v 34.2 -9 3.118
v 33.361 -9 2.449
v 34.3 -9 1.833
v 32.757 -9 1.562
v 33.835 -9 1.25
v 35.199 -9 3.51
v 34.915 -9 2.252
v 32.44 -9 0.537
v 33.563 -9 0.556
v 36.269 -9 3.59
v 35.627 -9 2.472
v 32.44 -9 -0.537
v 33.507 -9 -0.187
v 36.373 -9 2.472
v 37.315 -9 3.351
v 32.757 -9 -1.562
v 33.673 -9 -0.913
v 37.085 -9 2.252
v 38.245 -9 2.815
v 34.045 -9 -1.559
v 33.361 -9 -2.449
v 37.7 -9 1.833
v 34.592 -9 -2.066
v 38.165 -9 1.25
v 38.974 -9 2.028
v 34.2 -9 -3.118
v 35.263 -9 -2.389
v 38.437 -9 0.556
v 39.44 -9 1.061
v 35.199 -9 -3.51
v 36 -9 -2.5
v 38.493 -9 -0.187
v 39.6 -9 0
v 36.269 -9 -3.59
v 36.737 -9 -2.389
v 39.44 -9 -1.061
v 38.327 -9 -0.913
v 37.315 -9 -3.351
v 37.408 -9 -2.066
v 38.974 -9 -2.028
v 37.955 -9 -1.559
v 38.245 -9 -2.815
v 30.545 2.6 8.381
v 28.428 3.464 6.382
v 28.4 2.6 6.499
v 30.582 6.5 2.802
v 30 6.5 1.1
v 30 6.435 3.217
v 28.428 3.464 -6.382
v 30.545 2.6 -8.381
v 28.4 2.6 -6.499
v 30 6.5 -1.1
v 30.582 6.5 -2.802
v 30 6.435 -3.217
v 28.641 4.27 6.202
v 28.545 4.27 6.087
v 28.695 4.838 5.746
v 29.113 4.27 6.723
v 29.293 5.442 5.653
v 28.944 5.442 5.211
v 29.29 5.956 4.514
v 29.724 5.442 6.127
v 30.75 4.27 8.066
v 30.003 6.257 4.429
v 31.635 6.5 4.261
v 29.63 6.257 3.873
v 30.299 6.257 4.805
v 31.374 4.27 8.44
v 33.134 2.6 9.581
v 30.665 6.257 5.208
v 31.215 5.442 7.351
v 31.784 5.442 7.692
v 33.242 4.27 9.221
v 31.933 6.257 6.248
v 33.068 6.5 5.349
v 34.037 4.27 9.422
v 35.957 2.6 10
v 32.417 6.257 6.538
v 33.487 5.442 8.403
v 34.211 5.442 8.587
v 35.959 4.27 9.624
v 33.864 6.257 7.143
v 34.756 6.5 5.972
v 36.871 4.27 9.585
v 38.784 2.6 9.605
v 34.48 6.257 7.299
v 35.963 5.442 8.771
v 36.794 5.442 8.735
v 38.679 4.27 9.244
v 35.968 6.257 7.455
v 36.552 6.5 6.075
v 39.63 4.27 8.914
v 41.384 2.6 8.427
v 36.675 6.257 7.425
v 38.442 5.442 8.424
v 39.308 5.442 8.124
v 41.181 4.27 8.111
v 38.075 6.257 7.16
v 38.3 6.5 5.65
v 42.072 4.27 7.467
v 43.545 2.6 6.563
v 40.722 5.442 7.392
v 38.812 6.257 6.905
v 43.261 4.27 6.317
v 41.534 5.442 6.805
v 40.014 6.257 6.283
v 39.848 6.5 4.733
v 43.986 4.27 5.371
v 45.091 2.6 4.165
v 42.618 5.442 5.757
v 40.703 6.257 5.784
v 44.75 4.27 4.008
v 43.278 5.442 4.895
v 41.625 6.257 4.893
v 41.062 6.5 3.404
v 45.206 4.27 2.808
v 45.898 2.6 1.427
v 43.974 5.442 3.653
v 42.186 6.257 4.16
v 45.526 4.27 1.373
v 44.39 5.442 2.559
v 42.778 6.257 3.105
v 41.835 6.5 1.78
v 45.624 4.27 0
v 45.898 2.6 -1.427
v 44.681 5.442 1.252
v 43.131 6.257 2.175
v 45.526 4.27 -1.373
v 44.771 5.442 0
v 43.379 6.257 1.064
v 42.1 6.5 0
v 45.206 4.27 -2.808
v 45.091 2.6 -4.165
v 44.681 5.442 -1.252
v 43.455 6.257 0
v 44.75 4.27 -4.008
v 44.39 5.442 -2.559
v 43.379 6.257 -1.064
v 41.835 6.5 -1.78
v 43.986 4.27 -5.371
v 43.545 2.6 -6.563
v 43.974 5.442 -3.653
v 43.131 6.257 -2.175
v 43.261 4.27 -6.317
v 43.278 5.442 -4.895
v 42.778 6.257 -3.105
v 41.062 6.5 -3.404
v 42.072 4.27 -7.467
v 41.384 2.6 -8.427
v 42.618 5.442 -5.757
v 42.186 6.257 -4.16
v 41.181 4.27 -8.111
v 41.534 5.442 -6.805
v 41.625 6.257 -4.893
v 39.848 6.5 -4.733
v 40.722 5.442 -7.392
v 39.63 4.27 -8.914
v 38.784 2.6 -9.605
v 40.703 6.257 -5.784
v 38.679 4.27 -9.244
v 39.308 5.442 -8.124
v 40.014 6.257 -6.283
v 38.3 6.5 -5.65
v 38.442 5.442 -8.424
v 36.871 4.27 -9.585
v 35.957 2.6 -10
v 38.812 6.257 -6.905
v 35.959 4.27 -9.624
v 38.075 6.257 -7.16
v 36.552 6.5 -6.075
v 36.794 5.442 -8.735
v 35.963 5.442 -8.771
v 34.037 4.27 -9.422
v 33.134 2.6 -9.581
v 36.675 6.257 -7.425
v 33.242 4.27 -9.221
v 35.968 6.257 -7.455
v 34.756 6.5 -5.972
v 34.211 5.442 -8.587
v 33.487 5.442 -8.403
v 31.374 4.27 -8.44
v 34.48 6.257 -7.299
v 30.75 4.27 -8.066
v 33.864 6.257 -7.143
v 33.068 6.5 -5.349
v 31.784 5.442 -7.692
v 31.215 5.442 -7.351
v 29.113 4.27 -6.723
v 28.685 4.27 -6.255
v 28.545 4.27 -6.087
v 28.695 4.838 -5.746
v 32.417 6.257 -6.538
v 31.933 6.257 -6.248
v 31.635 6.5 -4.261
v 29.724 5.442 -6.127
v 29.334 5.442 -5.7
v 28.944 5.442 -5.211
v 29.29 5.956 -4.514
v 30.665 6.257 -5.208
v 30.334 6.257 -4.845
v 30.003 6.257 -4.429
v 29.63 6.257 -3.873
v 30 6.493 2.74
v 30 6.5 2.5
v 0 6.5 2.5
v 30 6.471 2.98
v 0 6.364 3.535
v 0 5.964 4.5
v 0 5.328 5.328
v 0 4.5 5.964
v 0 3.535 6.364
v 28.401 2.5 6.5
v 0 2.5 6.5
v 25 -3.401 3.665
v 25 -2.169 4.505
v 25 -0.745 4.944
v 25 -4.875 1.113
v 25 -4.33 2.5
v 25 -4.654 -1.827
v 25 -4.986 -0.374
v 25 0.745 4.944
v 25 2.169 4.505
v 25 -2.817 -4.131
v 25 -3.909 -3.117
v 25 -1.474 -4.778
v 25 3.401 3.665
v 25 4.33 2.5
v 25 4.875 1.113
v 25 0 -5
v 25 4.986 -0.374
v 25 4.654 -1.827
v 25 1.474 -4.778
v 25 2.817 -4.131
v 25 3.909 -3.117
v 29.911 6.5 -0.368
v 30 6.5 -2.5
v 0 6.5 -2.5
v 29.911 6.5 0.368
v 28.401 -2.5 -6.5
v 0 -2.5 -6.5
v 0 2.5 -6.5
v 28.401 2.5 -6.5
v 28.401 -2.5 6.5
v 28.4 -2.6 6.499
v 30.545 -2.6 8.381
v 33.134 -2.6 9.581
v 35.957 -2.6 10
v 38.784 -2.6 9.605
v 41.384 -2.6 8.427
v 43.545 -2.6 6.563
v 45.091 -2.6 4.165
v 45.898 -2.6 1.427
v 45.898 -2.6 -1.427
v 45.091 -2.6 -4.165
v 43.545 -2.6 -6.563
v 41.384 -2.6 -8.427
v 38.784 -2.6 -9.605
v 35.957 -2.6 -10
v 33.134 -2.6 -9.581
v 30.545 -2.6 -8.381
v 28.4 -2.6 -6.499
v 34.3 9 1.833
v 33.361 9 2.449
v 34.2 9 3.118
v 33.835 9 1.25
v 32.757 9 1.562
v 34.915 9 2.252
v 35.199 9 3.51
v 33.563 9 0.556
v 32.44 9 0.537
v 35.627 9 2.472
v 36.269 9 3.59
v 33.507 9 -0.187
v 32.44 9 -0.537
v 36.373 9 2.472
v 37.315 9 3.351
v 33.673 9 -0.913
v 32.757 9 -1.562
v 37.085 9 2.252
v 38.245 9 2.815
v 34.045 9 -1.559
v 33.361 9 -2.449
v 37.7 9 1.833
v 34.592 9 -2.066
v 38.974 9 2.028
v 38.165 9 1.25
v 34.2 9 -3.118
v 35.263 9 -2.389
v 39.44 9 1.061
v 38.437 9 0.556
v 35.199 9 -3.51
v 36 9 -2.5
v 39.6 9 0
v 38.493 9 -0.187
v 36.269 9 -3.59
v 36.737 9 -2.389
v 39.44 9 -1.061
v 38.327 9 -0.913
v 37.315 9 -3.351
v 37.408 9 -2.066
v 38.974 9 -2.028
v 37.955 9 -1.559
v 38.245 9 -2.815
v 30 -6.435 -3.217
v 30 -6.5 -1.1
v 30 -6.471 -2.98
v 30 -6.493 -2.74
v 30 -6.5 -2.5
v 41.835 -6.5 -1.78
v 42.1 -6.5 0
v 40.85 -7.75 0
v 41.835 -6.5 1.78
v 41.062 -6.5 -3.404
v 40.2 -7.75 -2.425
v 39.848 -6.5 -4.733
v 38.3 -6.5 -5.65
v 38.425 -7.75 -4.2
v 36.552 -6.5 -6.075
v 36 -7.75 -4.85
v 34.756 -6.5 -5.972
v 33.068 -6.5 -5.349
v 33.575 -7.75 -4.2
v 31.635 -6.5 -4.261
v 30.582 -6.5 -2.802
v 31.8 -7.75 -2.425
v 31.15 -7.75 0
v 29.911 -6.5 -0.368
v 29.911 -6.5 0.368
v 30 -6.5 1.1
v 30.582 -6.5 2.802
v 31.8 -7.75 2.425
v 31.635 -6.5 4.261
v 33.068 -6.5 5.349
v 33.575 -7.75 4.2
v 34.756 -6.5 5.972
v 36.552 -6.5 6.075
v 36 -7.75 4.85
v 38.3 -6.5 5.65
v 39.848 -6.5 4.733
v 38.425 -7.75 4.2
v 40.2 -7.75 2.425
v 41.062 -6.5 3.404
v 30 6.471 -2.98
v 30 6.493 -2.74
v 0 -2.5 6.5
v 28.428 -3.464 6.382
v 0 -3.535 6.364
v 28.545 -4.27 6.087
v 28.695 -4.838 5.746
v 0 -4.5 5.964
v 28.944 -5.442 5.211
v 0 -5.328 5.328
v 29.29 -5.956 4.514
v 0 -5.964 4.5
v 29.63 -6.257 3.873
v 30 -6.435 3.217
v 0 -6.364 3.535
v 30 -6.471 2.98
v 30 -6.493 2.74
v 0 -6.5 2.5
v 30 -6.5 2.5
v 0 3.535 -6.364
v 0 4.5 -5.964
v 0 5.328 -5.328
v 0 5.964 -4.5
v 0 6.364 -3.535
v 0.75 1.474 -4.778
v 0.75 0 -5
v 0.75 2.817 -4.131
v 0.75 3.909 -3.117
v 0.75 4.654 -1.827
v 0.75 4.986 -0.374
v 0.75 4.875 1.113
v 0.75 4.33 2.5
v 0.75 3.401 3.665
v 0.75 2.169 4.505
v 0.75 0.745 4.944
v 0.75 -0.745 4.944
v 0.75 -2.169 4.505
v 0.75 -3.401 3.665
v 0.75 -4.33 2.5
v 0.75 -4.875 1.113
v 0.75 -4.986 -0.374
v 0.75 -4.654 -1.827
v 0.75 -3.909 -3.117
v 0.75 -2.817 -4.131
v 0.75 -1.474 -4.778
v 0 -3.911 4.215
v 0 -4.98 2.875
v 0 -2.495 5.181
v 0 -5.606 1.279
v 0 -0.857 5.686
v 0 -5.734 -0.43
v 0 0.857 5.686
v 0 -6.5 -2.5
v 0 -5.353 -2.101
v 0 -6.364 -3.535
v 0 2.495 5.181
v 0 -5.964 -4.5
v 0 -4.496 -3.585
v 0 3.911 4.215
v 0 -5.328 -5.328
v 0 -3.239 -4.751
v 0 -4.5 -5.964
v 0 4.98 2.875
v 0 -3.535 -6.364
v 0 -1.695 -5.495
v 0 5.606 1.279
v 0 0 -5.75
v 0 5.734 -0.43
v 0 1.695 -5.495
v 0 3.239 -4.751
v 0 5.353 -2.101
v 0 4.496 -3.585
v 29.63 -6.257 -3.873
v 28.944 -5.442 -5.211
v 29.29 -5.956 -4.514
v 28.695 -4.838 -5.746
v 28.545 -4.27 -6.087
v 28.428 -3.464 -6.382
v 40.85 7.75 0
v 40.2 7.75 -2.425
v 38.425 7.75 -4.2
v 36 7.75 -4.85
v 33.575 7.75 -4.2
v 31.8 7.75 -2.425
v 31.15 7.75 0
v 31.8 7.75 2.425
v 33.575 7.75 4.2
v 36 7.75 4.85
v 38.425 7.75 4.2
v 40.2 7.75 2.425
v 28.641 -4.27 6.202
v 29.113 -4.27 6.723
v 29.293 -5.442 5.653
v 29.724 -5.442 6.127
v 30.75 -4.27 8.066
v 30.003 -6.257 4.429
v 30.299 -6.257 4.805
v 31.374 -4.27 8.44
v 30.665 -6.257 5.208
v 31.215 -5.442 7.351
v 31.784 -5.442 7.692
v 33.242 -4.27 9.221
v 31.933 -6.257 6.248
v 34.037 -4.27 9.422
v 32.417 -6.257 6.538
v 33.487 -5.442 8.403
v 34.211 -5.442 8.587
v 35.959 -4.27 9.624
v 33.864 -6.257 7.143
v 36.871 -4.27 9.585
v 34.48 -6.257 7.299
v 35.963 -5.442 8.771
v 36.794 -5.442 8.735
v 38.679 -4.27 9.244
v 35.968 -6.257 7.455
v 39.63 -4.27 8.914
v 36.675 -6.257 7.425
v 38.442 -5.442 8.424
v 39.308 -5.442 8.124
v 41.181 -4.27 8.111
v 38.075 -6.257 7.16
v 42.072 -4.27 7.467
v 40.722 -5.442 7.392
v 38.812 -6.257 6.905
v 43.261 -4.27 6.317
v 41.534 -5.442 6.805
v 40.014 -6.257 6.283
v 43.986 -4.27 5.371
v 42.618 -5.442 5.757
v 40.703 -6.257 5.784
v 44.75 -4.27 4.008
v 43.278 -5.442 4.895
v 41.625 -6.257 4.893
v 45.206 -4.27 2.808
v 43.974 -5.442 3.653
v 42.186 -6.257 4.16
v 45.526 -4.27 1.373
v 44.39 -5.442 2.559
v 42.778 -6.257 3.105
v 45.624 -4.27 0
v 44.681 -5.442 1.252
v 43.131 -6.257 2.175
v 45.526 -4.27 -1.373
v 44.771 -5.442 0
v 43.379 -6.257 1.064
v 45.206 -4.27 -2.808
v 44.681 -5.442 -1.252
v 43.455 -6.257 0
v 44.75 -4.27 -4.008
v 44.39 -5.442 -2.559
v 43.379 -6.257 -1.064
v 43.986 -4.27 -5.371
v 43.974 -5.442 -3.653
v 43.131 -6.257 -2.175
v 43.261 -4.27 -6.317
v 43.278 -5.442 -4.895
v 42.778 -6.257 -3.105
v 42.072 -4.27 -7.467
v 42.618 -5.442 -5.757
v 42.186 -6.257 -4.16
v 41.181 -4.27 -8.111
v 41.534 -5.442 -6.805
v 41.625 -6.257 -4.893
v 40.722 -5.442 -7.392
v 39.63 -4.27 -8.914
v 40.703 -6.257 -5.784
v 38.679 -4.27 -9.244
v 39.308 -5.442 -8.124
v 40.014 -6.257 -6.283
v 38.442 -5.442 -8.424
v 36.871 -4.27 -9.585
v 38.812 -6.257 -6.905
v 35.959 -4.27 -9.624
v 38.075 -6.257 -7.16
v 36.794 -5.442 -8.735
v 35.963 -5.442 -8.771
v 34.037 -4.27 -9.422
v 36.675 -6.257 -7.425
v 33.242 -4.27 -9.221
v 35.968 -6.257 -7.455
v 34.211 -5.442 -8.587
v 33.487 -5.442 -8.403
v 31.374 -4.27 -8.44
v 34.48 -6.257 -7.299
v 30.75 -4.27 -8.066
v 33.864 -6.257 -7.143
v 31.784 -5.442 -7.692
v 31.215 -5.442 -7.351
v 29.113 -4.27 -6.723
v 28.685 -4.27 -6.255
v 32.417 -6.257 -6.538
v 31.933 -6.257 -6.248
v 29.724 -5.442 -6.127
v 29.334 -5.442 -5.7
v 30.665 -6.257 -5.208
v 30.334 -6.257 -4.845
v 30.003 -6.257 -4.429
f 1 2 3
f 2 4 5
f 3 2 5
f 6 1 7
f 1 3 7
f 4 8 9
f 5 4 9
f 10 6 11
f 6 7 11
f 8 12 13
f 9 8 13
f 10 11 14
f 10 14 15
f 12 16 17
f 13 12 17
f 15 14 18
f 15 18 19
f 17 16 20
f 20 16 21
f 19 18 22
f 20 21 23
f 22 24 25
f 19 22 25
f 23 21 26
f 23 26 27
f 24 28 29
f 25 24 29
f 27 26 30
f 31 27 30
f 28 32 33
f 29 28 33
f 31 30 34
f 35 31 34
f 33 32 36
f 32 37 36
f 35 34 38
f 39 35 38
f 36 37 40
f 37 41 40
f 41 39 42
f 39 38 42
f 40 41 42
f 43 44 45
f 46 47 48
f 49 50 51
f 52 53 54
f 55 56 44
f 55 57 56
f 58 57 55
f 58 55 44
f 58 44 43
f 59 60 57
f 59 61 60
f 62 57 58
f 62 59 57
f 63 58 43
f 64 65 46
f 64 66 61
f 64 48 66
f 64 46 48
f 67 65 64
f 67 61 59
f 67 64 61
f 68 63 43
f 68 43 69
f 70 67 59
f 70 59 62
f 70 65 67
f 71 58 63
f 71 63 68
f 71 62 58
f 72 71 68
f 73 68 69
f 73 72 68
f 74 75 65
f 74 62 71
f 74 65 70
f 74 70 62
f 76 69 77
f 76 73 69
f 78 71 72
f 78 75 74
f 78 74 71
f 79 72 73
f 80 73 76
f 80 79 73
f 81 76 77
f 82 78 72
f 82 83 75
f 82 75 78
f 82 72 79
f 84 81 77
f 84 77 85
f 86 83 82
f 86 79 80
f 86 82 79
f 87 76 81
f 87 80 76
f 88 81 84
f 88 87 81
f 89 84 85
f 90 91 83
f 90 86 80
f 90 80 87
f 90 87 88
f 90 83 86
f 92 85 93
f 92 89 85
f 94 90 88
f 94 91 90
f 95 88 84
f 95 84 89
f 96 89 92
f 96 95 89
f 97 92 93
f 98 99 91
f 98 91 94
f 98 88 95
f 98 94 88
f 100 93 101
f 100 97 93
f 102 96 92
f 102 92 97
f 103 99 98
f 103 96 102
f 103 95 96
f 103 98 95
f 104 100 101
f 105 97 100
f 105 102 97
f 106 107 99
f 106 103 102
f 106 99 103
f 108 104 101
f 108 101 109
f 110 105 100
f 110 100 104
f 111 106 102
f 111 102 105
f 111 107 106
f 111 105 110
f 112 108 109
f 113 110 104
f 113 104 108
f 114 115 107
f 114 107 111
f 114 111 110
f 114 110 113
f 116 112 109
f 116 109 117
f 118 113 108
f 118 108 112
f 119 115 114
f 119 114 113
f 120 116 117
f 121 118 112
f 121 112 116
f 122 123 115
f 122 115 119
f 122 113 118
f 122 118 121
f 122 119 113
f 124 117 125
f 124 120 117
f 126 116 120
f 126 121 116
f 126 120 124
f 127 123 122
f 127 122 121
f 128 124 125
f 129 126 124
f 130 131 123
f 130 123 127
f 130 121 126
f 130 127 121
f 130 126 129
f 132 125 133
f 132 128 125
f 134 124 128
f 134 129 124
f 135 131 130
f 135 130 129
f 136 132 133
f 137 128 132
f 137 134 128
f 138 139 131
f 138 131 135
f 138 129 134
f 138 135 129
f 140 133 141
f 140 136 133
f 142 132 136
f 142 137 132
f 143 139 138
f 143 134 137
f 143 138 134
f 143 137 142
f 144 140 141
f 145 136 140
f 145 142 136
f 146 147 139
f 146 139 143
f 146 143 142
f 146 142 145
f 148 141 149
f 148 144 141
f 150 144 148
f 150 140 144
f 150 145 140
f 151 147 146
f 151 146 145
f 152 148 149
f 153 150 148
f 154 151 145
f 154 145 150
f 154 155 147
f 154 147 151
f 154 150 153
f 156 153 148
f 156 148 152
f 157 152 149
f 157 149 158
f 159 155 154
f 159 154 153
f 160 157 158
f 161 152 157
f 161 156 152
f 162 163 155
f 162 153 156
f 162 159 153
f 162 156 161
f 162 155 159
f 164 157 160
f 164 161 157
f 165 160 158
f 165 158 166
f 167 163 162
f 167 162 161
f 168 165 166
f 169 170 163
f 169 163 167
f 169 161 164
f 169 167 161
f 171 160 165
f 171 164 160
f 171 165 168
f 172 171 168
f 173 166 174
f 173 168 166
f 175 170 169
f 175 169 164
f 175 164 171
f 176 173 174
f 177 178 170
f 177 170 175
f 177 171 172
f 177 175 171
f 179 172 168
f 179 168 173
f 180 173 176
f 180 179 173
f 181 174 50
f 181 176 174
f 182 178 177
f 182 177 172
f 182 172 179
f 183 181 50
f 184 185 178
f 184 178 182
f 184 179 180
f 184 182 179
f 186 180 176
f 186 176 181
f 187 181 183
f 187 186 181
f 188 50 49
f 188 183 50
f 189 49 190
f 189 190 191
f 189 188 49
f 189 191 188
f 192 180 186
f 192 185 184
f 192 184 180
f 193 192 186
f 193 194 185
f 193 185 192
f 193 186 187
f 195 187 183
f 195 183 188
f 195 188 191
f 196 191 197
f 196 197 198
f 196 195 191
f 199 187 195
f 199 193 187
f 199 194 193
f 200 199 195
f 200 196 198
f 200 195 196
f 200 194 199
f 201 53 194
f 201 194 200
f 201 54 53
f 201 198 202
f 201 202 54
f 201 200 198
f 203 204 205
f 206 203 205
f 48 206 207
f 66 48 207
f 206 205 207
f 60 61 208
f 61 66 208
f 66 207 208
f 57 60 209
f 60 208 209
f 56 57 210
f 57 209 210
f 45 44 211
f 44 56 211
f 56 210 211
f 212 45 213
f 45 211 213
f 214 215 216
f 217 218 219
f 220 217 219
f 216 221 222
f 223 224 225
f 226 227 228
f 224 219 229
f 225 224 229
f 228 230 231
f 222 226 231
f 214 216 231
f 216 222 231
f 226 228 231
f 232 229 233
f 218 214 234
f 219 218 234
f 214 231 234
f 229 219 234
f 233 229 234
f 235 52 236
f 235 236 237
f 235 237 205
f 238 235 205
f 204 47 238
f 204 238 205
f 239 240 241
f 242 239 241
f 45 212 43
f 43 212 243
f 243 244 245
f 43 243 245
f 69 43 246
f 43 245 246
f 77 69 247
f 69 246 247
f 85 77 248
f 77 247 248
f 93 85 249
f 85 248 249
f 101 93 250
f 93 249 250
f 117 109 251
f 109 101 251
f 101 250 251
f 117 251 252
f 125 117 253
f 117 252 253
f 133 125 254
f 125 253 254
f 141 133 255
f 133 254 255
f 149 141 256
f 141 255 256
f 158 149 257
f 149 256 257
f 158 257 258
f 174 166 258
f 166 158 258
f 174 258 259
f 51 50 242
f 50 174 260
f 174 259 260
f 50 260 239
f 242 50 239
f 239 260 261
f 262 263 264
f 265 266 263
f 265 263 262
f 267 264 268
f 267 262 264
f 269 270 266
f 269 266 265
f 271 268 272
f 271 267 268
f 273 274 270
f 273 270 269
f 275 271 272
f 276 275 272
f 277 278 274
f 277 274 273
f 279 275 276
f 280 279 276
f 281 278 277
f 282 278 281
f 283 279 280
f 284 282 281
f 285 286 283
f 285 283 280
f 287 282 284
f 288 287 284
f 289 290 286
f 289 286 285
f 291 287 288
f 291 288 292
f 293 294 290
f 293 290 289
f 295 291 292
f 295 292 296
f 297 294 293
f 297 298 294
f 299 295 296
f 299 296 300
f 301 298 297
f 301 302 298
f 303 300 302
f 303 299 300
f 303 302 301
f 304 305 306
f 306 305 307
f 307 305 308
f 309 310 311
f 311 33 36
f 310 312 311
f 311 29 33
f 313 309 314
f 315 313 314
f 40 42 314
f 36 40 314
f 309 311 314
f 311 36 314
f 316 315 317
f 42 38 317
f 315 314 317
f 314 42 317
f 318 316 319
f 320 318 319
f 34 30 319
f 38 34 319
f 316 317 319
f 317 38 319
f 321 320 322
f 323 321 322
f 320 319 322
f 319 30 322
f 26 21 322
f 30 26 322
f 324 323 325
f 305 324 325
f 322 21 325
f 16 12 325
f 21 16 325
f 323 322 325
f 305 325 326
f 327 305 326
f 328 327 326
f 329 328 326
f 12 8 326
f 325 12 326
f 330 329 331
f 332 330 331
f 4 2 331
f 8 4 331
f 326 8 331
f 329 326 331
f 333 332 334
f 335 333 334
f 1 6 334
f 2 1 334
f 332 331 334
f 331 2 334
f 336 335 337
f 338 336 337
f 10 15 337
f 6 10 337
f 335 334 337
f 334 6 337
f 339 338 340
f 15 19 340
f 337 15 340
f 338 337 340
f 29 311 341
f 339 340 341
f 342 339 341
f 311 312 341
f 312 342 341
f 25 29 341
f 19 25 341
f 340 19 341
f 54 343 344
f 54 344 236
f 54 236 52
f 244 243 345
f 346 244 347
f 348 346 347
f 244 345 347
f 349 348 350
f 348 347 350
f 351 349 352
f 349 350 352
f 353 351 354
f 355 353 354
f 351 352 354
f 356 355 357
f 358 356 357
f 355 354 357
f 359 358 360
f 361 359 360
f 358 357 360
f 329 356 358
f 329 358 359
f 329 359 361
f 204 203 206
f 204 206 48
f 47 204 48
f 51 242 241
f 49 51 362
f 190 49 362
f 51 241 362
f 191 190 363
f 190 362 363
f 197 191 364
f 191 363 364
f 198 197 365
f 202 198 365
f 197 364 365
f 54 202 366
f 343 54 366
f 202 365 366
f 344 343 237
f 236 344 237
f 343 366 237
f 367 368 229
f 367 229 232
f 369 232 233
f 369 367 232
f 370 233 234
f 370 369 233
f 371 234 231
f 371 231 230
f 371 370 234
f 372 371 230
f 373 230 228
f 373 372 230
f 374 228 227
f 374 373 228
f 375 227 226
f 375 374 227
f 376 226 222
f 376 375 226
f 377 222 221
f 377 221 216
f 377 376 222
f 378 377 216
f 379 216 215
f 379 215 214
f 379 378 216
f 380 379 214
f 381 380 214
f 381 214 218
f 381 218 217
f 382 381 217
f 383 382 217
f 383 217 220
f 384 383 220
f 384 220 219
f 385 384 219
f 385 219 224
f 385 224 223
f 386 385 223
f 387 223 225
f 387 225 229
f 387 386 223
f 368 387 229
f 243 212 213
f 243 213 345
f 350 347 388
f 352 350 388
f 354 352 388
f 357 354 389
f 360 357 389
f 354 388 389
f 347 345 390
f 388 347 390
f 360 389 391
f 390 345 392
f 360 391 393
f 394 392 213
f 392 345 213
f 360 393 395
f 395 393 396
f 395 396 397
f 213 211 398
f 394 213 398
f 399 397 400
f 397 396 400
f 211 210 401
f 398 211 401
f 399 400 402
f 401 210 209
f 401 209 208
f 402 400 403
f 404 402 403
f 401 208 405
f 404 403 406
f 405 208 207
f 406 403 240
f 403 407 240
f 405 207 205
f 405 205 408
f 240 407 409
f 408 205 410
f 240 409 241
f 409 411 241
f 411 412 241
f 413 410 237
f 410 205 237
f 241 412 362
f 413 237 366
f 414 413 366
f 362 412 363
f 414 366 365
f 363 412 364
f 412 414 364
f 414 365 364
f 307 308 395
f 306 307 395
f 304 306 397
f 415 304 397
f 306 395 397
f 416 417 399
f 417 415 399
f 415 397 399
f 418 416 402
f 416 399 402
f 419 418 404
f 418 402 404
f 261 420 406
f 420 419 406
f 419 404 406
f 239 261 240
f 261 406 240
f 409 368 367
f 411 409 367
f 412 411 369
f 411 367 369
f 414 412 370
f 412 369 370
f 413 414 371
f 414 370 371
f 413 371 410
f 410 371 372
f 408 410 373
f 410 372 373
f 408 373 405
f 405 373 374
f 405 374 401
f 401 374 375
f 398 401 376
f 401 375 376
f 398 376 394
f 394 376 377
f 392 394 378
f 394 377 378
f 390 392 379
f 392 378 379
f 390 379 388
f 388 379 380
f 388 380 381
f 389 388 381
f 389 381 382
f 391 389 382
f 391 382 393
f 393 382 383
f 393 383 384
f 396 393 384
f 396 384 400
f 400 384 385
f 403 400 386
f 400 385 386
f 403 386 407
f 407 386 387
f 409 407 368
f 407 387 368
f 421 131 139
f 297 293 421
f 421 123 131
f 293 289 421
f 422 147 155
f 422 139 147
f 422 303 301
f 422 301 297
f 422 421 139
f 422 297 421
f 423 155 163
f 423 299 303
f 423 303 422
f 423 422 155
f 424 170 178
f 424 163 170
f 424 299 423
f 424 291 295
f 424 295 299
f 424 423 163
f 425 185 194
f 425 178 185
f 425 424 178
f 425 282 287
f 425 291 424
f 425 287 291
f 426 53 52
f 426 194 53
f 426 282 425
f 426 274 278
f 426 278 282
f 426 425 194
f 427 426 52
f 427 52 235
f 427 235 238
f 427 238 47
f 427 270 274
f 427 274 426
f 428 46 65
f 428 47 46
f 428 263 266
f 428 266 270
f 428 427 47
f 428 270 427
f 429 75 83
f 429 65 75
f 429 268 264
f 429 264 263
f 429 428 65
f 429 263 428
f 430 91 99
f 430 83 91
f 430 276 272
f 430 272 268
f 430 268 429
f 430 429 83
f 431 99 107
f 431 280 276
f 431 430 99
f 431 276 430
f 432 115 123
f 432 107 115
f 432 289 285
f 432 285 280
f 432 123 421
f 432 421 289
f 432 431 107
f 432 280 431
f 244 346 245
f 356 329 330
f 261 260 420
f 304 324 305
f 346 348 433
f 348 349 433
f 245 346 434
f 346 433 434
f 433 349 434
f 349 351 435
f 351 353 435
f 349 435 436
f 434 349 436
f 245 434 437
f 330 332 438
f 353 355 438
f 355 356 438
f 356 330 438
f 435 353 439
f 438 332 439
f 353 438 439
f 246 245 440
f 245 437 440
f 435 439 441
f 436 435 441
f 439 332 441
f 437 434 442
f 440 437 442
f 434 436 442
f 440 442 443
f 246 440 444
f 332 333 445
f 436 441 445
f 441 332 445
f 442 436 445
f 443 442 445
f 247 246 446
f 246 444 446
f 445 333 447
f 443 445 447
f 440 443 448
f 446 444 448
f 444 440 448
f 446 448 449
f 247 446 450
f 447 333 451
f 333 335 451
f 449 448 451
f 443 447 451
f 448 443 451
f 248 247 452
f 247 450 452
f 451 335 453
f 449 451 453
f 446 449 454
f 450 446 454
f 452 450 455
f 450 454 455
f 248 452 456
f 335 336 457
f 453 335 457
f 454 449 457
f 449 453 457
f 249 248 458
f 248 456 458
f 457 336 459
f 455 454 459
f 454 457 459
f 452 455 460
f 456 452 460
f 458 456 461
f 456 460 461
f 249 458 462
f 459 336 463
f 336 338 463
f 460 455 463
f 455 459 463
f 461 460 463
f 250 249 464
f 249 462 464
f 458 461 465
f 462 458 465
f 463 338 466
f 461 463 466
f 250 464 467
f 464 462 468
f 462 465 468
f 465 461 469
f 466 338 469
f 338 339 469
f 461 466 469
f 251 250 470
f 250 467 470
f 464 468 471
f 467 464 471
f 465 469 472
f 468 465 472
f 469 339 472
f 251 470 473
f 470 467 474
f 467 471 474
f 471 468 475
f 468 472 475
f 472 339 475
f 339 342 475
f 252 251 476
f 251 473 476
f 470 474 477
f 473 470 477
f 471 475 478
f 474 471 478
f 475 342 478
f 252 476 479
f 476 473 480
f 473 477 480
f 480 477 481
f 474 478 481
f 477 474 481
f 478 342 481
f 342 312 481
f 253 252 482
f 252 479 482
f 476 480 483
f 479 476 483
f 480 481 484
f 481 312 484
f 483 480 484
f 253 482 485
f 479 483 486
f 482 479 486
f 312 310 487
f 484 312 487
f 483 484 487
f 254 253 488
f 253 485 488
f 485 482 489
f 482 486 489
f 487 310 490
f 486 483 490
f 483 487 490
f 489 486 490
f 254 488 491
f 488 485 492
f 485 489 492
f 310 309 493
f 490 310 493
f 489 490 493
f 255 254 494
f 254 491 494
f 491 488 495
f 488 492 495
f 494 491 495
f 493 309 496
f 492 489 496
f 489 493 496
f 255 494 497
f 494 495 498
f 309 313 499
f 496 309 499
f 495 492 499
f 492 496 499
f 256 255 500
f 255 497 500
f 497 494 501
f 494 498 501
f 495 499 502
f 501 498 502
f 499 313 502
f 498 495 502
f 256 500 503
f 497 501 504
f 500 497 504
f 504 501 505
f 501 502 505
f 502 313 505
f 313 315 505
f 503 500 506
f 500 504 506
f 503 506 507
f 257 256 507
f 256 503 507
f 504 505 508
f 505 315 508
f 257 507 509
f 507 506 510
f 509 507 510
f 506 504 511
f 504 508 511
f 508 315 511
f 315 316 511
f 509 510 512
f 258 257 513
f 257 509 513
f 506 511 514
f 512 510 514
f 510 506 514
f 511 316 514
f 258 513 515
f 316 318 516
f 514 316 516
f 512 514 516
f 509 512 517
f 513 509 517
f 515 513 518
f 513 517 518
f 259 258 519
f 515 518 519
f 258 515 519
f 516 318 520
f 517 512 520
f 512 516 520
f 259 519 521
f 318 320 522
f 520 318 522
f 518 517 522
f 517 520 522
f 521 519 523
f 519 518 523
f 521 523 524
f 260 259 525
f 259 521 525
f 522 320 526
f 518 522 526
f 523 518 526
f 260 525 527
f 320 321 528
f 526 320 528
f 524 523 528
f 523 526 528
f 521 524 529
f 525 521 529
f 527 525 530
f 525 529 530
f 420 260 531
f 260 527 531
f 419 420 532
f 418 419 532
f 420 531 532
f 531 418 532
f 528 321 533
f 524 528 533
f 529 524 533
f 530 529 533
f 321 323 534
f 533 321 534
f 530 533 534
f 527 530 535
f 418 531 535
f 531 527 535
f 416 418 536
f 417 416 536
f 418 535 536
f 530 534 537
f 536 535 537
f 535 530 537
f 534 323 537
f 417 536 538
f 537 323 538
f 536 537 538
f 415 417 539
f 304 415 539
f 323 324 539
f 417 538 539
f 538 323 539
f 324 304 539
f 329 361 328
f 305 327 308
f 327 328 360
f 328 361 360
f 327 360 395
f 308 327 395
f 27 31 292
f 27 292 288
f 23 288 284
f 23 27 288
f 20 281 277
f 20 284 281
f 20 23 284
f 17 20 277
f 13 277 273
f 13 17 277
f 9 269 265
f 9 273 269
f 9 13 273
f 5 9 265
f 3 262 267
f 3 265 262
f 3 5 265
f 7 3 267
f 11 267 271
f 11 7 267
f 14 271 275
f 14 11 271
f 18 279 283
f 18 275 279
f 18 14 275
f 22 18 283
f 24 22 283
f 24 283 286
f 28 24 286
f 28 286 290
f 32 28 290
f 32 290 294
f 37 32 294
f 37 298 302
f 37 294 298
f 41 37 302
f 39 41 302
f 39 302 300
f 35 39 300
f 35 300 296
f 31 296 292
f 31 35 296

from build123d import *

# Parameters (mm, degrees)
BOSS_EXTRUDE1_DEPTH     = 30
SKETCH1_3_R             = 5
CUT_EXTRUDE1_DEPTH      = 25
CHAMFER1_SIZE           = 0.75
SKETCH3_W               = 10
SKETCH3_H               = 5
SKETCH7_R               = 6.1
BOSS_EXTRUDE3_DEPTH     = 2.5
BOSS_EXTRUDE3_TAPER     = 45
CUT_EXTRUDE3_DEPTH      = 51.39841282
CUT_EXTRUDE3_DEPTH_BACK = 200
SKETCH8_R               = 2.5


with BuildPart() as part:
    # Sketch1 → Boss-Extrude1 (new body)
    with BuildSketch(Plane(origin=(0, 0, 0), x_dir=(0, 0, -1), z_dir=(1, 0, 0))):
        with BuildLine():
            ThreePointArc((6.5, 2.5), (5.328427125, 5.328427125), (2.5, 6.5))
            Line((2.5, 6.5), (-2.5, 6.5))
            ThreePointArc((-2.5, 6.5), (-5.328427125, 5.328427125), (-6.5, 2.5))
            Line((-6.5, 2.5), (-6.5, -2.5))
            ThreePointArc((-6.5, -2.5), (-5.328427125, -5.328427125), (-2.5, -6.5))
            Line((-2.5, -6.5), (2.5, -6.5))
            ThreePointArc((2.5, -6.5), (5.328427125, -5.328427125), (6.5, -2.5))
            Line((6.5, -2.5), (6.5, 2.5))
        make_face()
    extrude(amount=BOSS_EXTRUDE1_DEPTH)

    # Sketch1<3> → Cut-Extrude1 (cut)
    with BuildSketch(Plane(origin=(0, 0, 0), x_dir=(0, 0, -1), z_dir=(1, 0, 0))):
        Circle(SKETCH1_3_R)
    extrude(amount=CUT_EXTRUDE1_DEPTH, mode=Mode.SUBTRACT)

    # Chamfer1
    chamfer1_edges = [part.edges().sort_by_distance(p)[0] for p in [
        (0, 0, 5),
    ]]
    chamfer(chamfer1_edges, length=CHAMFER1_SIZE)

    # Sketch3 → Revolve2 (revolve)
    with BuildSketch(Plane(origin=(36, 0, 0), x_dir=(0, 0, -1), z_dir=(1, 0, 0))):
        with Locations((-5, 0)):
            Rectangle(SKETCH3_W, SKETCH3_H)
    revolve(axis=Axis((36, -11.950836094, 0), (0, 1, 0)))

    # Sketch4 → Revolve3 (revolve)
    with BuildSketch(Plane(origin=(36, 0, 0), x_dir=(0, 0, -1), z_dir=(1, 0, 0))):
        with BuildLine():
            Line((0, 2.5), (-10, 2.5))
            Line((-10, 2.5), (-10, 2.6))
            ThreePointArc((-10, 2.6), (-8.857716447, 5.357716447), (-6.1, 6.5))
            Line((-6.1, 6.5), (0, 6.5))
            Line((0, 6.5), (0, 2.5))
        make_face()
    revolve3 = revolve(axis=Axis((36, -7.102905922, 0), (0, 1, 0)))

    # Mirror3: Revolve3 across plane
    add(revolve3.mirror(Plane.ZX))

    # Sketch7 → Boss-Extrude3 (add)
    with BuildSketch(Plane(origin=(0, 6.5, 0), x_dir=(1, 0, 0), z_dir=(0, 1, 0))):
        with Locations((36, 0)):
            Circle(SKETCH7_R)
    boss_extrude3 = extrude(amount=BOSS_EXTRUDE3_DEPTH, taper=BOSS_EXTRUDE3_TAPER)

    # Mirror5: Boss-Extrude3 across plane
    add(boss_extrude3.mirror(Plane.ZX))

    # Sketch8 → Cut-Extrude3 (cut, two sides: drawn at the far end of the back side and taken through both)
    with BuildSketch(Plane(origin=(0, 9, 0), x_dir=(1, 0, 0), z_dir=(0, 1, 0)).offset(-CUT_EXTRUDE3_DEPTH_BACK)):
        with Locations((36, 0)):
            Circle(SKETCH8_R)
    extrude(amount=CUT_EXTRUDE3_DEPTH + CUT_EXTRUDE3_DEPTH_BACK, mode=Mode.SUBTRACT)


solid = part.part
